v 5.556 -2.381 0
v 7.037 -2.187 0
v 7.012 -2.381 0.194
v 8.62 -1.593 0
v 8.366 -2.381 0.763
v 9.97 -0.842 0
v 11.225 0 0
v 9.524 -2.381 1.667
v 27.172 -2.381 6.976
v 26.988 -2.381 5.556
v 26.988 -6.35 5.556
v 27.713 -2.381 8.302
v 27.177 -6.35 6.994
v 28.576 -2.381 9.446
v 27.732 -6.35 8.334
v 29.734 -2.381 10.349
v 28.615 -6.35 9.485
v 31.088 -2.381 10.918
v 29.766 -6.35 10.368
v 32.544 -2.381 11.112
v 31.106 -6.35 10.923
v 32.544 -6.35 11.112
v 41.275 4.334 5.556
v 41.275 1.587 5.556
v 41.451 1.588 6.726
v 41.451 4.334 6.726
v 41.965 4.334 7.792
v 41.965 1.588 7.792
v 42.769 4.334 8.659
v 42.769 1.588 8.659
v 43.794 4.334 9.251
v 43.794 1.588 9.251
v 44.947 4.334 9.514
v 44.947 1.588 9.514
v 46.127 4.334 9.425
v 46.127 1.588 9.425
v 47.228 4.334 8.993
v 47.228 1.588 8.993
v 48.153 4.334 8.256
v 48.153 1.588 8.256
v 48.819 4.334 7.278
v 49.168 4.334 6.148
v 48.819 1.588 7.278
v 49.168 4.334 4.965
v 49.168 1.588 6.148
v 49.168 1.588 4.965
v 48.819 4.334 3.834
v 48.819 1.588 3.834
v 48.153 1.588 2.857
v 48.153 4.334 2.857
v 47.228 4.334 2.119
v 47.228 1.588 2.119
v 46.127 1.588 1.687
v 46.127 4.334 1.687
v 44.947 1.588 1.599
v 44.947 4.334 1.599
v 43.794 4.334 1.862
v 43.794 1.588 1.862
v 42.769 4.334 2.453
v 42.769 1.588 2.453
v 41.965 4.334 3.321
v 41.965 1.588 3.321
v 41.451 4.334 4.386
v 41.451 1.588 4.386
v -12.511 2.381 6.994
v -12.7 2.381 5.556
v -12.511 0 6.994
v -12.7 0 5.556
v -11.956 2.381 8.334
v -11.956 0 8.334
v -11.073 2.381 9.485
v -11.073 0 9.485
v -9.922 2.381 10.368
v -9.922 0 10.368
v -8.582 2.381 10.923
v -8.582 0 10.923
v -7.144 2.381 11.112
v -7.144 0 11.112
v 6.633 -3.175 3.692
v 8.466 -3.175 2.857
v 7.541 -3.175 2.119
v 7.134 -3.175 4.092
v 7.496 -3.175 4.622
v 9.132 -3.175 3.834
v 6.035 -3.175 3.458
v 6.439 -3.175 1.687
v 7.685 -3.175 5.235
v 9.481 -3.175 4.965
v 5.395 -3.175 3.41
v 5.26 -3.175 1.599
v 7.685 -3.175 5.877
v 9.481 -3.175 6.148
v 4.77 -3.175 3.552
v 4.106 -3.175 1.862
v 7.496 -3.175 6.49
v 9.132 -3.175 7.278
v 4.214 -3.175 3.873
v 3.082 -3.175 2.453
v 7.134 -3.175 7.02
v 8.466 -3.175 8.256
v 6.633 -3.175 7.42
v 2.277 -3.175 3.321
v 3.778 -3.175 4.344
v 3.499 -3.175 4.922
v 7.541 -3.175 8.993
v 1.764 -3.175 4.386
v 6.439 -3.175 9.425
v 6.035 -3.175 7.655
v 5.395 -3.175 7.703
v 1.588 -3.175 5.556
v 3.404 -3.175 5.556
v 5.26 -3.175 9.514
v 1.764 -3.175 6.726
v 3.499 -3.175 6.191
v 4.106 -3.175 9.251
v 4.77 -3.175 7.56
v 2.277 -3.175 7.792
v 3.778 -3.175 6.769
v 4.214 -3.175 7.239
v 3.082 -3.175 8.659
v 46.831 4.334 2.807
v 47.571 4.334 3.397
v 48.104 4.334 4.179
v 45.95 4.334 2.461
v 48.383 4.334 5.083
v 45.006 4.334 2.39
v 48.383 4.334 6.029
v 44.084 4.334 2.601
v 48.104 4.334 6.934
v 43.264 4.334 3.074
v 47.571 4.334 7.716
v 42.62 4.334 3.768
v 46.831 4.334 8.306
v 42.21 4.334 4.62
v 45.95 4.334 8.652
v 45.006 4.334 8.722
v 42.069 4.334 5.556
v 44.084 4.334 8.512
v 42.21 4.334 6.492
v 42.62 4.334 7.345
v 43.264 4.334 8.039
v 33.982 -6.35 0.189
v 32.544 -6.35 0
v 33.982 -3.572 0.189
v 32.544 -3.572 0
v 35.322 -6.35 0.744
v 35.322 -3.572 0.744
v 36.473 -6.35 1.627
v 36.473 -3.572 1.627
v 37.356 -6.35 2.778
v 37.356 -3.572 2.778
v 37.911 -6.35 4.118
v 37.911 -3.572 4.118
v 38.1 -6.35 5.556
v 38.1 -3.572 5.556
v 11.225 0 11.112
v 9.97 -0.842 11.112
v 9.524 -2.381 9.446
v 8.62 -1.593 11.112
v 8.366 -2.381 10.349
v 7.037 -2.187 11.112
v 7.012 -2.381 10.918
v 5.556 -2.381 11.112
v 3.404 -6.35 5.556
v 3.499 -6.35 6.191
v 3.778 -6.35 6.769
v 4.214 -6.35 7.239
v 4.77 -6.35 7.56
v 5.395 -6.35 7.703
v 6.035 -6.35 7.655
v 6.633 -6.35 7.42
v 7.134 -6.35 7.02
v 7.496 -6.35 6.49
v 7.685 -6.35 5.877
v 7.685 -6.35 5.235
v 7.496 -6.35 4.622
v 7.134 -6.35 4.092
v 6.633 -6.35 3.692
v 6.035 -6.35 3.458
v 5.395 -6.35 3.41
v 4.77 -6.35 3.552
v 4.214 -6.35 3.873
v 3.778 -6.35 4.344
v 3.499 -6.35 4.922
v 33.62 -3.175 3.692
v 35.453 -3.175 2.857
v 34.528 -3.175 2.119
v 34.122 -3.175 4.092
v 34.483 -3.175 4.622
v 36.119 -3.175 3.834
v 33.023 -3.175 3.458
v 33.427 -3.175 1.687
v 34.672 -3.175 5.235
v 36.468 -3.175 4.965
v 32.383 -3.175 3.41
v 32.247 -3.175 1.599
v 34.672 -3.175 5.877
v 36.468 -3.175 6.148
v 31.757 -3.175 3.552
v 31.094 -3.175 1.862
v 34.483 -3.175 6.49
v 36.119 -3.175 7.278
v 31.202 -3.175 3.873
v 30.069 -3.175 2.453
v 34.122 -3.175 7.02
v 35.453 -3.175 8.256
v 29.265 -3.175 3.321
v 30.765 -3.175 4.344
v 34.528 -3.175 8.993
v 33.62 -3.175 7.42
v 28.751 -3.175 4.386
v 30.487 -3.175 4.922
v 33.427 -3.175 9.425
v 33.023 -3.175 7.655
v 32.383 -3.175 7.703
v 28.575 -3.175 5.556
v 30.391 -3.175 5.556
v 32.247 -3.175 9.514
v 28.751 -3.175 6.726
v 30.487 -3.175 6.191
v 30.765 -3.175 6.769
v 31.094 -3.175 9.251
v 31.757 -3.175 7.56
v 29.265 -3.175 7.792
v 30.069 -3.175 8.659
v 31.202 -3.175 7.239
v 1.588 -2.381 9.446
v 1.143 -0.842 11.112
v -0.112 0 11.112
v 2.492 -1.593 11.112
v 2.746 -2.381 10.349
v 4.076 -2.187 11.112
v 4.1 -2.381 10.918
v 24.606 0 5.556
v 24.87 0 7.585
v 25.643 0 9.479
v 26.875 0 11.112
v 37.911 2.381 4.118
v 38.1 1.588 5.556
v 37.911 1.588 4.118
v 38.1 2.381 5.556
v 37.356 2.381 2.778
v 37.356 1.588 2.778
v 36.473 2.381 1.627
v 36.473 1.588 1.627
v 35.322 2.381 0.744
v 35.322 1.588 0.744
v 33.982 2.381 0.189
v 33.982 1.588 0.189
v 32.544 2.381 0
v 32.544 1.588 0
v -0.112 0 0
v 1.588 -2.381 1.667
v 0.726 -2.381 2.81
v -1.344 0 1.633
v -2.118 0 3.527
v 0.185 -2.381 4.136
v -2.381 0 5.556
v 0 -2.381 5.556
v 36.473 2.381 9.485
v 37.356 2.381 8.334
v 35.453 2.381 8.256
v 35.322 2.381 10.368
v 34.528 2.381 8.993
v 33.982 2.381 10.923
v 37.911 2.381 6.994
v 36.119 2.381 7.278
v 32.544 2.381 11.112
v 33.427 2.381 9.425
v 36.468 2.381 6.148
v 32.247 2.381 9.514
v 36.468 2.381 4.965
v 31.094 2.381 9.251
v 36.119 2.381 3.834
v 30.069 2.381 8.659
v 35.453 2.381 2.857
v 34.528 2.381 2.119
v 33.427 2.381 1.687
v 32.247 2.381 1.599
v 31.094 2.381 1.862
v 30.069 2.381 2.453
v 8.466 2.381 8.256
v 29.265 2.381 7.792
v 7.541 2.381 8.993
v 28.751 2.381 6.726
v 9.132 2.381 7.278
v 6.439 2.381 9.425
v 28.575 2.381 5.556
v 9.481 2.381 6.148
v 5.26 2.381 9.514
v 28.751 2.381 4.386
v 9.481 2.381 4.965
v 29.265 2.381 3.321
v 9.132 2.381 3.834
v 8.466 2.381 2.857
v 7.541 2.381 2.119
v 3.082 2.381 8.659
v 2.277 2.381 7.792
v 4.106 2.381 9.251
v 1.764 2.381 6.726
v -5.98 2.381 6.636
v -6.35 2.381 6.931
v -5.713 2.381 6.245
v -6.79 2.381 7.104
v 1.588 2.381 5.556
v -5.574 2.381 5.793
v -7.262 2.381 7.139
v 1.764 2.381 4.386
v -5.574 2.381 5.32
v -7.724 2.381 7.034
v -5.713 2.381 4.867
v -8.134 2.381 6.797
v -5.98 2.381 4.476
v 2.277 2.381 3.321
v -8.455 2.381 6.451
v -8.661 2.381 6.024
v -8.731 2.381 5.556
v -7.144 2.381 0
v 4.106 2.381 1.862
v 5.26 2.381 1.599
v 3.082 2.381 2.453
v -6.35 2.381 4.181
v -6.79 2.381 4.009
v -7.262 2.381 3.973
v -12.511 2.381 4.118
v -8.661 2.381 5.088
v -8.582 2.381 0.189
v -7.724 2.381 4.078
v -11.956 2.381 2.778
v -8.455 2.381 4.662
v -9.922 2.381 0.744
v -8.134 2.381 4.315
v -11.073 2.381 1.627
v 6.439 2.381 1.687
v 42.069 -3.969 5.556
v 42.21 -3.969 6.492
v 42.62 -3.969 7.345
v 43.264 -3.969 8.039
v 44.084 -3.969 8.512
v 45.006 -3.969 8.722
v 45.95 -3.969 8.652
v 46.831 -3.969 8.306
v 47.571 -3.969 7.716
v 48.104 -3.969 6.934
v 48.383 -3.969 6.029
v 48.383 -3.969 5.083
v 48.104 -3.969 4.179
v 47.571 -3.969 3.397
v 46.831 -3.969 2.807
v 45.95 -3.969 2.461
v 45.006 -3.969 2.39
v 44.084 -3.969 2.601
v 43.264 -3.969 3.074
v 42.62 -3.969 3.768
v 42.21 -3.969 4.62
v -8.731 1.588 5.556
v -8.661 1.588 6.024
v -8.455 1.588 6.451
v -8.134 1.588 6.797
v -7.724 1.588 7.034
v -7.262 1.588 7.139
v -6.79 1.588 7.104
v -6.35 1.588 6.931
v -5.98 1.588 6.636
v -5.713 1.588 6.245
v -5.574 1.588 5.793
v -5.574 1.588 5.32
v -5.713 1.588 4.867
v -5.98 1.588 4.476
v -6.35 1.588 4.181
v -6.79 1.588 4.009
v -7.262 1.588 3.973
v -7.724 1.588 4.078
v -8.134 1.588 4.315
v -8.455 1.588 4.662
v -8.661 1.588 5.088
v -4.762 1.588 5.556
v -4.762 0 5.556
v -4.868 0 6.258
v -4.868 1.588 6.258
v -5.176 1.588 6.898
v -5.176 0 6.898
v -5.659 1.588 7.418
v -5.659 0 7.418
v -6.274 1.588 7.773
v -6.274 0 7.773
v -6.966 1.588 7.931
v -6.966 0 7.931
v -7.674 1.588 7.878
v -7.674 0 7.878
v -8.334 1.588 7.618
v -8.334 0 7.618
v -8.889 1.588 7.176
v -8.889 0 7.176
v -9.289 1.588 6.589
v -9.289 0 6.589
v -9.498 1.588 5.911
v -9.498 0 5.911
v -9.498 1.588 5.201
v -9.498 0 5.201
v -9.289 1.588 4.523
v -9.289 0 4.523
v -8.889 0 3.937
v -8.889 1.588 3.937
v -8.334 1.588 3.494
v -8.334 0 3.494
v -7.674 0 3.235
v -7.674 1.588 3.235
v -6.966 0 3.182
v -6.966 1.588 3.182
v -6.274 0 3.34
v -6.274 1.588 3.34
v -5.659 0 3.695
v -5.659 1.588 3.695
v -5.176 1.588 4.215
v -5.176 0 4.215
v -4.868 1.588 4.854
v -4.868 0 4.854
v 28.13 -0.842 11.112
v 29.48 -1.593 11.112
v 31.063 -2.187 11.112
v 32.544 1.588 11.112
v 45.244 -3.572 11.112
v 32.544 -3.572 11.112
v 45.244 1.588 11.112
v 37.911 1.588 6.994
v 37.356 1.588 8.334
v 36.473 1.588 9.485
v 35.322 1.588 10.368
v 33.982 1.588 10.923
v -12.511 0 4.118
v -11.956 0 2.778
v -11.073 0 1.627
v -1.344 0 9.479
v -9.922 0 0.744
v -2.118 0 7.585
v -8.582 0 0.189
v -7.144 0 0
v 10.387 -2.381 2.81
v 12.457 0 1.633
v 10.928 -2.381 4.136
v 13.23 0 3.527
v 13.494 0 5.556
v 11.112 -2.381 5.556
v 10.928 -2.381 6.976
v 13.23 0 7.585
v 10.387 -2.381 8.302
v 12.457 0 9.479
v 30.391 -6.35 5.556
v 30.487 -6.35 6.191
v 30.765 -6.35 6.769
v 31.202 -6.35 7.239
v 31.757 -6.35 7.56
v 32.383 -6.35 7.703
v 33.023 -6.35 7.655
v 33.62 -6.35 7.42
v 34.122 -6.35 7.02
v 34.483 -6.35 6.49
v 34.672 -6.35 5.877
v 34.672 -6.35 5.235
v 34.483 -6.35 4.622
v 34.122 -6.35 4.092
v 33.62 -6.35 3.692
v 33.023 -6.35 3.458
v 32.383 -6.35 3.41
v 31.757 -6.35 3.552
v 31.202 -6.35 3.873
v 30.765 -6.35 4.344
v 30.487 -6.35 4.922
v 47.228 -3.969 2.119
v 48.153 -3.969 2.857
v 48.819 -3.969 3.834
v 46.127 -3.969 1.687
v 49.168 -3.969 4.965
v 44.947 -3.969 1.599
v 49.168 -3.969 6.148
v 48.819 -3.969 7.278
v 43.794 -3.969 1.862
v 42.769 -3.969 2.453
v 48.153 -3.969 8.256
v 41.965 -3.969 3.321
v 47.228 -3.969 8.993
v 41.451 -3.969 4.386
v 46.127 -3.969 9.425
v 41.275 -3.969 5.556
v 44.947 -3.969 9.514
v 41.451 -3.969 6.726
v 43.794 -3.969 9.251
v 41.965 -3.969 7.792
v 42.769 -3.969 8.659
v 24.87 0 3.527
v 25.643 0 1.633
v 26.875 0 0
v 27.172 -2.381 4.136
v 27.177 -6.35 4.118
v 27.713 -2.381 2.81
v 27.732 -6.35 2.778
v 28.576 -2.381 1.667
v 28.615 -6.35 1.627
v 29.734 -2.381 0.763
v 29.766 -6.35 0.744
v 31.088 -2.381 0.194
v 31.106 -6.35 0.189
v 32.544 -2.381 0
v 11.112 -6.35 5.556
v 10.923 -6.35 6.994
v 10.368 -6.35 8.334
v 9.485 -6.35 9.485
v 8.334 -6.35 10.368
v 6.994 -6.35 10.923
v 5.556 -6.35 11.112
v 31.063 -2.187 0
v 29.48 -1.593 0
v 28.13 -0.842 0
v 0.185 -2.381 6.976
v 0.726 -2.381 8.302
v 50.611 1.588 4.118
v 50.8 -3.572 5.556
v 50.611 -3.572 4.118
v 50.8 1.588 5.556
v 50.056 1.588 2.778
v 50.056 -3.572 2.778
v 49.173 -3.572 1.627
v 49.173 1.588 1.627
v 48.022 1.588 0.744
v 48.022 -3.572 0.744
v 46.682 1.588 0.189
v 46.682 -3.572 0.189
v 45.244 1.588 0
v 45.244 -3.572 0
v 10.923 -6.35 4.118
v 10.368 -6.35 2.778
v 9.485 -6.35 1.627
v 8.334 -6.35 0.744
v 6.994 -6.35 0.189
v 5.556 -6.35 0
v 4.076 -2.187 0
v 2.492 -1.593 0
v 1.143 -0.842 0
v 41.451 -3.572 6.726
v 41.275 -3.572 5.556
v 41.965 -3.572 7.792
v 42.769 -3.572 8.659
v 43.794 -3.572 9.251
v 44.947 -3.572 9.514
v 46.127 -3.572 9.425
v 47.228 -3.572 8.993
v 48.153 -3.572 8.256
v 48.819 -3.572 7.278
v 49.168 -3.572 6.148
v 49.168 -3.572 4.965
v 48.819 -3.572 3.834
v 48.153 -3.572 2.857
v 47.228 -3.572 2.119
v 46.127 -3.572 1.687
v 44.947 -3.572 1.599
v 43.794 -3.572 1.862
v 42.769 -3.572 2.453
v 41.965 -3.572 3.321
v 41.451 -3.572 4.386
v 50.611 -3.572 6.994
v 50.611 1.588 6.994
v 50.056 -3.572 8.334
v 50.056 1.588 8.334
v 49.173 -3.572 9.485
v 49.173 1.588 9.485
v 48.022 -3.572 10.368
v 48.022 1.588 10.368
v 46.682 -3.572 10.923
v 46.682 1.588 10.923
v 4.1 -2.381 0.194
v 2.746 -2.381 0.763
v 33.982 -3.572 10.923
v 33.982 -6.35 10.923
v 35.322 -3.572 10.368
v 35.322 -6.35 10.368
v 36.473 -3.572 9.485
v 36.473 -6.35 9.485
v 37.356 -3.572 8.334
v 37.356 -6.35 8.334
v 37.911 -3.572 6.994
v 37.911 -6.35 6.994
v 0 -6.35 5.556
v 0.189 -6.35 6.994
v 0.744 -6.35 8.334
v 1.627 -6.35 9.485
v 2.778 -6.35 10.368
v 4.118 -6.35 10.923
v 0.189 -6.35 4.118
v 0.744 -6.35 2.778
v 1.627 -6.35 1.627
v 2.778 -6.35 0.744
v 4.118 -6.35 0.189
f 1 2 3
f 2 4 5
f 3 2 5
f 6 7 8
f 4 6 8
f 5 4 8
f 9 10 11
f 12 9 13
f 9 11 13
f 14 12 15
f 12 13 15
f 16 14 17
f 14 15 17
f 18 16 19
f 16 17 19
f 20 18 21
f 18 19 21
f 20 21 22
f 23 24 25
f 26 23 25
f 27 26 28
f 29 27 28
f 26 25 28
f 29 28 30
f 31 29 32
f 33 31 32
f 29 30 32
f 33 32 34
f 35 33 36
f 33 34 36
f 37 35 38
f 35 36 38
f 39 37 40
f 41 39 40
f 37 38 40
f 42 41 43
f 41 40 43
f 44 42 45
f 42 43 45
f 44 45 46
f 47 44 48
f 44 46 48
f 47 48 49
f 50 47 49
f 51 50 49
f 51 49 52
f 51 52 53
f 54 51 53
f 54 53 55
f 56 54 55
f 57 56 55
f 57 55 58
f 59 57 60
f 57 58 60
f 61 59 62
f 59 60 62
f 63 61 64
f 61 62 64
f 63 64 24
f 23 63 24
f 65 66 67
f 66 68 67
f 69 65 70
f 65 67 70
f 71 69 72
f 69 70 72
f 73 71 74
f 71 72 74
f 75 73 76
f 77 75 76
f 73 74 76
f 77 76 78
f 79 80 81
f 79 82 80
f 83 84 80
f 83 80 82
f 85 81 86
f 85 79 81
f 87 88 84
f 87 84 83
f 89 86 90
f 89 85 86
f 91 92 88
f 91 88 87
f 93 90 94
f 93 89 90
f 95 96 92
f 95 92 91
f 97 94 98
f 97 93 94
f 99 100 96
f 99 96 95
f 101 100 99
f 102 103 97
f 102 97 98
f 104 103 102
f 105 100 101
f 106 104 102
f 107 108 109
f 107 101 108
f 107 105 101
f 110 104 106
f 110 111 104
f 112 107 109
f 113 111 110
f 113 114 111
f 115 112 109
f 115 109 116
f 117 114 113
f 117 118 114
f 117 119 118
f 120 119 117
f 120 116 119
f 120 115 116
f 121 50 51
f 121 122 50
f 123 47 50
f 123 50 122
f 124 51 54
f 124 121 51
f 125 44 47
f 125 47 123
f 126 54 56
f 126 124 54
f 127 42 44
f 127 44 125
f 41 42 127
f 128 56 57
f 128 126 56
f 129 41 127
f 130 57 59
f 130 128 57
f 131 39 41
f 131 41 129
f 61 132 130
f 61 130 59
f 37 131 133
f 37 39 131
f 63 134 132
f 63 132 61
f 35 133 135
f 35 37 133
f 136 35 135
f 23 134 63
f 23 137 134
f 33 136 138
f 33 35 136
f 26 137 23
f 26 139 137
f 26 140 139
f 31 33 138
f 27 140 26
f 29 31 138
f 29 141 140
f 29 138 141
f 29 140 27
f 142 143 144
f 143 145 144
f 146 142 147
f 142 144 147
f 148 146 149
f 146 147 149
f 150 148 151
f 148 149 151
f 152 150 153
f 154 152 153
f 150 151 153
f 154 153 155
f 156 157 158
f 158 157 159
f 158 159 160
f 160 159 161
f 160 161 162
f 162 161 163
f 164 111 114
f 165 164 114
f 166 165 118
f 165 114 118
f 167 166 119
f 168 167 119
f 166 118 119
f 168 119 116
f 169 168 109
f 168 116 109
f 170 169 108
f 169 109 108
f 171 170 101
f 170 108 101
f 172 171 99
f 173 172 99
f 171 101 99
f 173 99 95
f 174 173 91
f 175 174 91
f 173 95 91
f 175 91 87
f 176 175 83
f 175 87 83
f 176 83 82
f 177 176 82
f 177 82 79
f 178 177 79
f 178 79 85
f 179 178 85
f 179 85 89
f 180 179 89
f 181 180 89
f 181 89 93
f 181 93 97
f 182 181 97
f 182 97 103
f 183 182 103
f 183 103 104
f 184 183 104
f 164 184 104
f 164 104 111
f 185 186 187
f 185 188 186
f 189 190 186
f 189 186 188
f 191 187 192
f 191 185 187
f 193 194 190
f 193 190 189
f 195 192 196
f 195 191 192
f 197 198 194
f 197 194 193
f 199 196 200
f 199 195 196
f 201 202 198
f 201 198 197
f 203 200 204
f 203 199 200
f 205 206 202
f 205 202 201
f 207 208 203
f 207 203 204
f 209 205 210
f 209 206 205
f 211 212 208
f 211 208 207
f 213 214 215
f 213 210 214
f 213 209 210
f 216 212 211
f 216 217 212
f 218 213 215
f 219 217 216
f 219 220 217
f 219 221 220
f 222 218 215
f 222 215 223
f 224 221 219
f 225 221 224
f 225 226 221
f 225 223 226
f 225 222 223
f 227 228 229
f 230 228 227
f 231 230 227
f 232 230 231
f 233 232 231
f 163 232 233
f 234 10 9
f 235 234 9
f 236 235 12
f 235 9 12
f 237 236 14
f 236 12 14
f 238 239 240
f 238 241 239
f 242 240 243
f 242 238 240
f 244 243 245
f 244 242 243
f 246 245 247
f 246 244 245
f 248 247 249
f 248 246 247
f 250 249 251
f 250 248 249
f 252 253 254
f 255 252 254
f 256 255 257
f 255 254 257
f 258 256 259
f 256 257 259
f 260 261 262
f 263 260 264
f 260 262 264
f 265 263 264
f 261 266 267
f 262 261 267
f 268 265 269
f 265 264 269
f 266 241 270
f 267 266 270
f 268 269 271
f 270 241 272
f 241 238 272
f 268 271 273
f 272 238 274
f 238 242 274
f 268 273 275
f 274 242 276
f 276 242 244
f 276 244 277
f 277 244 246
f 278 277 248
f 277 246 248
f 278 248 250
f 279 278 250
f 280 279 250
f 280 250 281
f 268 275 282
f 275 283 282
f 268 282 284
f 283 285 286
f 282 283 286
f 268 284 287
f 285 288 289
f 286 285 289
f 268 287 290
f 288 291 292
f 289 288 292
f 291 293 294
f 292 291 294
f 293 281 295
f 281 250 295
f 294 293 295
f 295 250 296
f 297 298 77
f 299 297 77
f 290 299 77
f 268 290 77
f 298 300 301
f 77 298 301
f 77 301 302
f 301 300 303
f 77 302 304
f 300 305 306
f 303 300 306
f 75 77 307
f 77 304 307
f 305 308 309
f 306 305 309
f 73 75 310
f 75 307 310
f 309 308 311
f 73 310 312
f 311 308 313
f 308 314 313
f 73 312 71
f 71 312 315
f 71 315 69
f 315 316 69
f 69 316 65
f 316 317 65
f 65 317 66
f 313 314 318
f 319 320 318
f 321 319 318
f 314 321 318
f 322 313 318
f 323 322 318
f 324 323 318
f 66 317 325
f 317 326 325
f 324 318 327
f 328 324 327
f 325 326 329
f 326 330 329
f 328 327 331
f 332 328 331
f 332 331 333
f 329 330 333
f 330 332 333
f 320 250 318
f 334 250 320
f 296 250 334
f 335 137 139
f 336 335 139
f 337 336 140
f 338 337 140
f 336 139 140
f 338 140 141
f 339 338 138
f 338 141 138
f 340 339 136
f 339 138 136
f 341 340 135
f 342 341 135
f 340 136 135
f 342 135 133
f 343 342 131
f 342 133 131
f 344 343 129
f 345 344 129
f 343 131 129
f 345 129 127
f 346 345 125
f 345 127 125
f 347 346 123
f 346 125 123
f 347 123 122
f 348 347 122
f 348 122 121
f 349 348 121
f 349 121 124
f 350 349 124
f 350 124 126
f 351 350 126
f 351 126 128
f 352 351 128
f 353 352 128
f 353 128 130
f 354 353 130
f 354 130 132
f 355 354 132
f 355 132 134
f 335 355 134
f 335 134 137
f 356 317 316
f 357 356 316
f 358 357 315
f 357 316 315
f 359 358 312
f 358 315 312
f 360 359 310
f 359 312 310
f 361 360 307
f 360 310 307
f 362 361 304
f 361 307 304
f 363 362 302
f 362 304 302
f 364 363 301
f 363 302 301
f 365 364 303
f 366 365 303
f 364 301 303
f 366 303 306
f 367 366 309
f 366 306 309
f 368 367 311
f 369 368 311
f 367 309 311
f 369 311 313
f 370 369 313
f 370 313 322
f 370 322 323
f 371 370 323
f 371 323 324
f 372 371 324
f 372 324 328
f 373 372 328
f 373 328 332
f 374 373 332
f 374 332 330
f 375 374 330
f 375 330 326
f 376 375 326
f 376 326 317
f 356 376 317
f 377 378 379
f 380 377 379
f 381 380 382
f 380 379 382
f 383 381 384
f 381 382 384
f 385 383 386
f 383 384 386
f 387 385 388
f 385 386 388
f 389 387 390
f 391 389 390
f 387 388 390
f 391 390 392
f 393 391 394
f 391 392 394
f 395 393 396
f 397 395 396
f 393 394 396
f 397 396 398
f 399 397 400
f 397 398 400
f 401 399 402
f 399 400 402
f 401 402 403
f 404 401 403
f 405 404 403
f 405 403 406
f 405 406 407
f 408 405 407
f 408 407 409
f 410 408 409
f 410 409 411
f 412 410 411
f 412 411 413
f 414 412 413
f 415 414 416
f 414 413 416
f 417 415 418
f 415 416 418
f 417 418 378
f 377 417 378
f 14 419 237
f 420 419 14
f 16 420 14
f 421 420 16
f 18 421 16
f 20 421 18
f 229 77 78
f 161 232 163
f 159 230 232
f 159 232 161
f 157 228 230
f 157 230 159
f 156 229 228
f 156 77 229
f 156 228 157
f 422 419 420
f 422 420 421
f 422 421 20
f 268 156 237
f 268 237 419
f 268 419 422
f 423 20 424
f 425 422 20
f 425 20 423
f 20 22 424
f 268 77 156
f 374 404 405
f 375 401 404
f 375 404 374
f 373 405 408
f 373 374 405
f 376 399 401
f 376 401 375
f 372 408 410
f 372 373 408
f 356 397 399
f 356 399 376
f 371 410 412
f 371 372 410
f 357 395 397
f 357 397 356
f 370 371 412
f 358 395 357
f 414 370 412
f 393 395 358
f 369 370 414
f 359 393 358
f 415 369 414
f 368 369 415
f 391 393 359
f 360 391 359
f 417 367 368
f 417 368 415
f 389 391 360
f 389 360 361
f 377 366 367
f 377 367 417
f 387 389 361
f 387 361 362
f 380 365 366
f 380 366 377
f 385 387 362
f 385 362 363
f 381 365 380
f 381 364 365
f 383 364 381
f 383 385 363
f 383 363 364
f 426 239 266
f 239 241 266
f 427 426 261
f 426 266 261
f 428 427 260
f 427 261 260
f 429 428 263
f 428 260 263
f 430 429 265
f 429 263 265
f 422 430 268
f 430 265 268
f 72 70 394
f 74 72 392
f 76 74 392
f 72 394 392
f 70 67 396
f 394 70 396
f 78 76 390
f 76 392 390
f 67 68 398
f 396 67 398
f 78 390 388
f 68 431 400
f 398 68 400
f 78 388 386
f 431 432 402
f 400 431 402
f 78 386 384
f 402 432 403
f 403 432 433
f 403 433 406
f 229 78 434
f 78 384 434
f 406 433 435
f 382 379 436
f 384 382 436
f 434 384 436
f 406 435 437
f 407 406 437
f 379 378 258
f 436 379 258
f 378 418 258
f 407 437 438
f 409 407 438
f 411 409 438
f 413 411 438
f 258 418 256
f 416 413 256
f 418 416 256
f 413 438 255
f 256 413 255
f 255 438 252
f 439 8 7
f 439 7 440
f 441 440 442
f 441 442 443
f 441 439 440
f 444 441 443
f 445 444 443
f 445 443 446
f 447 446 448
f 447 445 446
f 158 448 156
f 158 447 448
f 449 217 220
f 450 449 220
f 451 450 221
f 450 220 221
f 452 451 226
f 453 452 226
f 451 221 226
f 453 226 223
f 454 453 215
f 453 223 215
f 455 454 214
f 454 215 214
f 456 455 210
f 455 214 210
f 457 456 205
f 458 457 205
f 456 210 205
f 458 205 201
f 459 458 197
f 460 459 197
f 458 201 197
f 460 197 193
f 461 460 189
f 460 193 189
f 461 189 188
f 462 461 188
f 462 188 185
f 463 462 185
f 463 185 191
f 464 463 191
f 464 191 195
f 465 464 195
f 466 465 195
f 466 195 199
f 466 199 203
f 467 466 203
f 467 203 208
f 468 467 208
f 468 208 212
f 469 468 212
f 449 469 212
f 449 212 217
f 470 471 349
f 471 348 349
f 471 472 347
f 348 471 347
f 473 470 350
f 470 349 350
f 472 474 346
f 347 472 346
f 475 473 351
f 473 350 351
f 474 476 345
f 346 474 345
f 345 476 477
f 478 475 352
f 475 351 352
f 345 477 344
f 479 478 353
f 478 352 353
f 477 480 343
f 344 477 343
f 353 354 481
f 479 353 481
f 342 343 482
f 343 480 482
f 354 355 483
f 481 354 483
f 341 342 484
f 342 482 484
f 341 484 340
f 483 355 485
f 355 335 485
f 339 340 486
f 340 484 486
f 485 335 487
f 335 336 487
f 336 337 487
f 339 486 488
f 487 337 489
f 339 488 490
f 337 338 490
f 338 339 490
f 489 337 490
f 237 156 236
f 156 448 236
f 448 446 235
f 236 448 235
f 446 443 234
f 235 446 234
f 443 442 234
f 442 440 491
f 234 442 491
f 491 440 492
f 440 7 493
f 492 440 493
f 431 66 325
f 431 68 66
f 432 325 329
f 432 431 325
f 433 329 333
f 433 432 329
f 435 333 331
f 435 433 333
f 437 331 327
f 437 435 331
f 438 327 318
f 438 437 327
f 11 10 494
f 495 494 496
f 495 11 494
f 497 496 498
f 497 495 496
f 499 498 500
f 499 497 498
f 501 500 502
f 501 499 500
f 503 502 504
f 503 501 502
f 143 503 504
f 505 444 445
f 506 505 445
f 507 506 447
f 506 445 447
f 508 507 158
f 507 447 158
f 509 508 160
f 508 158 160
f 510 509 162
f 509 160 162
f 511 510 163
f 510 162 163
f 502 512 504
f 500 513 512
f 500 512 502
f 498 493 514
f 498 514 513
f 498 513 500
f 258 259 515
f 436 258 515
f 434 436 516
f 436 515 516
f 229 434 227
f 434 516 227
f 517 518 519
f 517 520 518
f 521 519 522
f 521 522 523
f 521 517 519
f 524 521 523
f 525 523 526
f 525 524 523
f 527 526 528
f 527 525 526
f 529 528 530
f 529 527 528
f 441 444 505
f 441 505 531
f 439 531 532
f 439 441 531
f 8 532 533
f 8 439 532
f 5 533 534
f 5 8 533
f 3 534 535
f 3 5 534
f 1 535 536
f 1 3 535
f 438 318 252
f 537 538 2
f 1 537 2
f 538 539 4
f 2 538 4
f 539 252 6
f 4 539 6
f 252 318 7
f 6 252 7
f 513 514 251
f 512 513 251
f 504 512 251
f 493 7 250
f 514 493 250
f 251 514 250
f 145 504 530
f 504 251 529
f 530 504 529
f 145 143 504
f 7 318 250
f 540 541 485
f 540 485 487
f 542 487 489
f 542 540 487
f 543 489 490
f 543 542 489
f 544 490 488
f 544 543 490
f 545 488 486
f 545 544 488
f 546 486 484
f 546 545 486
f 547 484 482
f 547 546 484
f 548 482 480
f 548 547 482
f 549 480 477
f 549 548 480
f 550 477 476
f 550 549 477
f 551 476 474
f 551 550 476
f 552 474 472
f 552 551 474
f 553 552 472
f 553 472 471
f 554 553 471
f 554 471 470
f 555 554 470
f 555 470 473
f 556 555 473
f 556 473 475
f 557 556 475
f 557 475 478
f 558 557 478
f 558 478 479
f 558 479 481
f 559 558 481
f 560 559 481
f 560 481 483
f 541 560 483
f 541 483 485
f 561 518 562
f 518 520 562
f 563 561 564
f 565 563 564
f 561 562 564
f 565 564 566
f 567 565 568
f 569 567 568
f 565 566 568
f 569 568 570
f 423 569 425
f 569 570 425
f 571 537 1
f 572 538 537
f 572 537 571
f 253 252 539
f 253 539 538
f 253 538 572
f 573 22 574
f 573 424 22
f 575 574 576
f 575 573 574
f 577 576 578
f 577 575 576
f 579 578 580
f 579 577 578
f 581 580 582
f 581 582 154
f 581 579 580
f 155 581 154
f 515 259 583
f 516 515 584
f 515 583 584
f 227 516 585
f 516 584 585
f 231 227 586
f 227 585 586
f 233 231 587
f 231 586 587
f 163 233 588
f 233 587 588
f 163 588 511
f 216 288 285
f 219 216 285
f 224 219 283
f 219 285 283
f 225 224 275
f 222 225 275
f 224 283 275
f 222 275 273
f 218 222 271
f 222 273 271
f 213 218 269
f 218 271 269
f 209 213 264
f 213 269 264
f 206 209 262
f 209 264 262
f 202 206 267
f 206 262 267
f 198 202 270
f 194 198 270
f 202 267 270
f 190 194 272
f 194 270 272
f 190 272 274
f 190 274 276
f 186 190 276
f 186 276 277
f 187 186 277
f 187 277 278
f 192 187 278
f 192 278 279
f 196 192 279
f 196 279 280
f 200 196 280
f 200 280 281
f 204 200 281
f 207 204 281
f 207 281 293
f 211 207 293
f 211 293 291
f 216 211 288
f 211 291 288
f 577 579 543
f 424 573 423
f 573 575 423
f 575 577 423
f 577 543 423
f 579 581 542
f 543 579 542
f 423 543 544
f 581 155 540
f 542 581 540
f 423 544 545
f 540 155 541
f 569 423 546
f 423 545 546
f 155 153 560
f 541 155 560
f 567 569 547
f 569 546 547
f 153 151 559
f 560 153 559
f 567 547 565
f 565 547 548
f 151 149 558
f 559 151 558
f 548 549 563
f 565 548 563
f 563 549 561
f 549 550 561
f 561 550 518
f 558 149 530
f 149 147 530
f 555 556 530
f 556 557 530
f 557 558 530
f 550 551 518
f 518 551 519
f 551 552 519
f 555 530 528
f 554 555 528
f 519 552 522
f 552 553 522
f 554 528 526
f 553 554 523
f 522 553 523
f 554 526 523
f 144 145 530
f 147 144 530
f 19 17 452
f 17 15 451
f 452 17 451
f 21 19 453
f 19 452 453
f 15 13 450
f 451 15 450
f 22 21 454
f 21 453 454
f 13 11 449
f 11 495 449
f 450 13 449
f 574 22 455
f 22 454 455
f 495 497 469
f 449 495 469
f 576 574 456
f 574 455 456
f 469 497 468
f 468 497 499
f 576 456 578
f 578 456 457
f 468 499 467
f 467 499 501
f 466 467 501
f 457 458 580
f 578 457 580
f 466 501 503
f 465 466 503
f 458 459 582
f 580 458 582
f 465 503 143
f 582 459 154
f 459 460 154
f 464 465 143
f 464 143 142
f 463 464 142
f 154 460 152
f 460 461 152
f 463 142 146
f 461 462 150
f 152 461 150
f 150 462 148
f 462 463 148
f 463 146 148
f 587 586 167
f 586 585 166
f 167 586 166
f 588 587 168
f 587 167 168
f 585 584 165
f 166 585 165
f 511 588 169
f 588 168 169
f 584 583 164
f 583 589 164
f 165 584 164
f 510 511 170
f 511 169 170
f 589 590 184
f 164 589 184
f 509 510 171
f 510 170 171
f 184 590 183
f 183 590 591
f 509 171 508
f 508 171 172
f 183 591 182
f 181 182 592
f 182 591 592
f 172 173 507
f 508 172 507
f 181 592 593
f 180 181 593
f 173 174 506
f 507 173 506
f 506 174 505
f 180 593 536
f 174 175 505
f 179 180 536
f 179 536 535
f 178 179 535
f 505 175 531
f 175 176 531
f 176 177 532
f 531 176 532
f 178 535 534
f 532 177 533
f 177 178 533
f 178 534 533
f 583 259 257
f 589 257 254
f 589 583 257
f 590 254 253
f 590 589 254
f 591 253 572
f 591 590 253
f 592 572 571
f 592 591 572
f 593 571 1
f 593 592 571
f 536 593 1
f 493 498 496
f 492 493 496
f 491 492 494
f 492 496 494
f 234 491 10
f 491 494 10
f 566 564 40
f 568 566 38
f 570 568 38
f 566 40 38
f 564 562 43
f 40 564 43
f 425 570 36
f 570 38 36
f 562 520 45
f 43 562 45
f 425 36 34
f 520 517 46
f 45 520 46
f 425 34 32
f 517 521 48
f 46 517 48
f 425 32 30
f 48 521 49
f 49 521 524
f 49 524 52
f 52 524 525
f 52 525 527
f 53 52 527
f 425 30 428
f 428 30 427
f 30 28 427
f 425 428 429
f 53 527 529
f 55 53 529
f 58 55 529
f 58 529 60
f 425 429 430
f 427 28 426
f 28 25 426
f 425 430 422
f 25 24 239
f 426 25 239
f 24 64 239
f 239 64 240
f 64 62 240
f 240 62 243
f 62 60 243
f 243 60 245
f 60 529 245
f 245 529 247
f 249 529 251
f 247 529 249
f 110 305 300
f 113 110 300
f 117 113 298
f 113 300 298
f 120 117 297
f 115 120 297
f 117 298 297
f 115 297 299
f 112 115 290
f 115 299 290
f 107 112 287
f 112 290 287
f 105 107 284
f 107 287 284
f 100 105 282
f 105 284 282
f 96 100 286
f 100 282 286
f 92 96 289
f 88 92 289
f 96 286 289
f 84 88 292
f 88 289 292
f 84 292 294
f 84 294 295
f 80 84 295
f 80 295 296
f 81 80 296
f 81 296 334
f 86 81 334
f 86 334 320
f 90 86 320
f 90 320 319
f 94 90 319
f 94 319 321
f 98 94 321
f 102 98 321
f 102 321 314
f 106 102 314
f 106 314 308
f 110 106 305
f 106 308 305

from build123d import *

# Parameters (mm, degrees)
F1_DEPTH      = 11.1125
F2_R          = 3.175
F2_R_2        = 1.5875
F2_R_3        = 2.15265
F3_DEPTH      = 8.73125
F4_R          = 2.38125
F5_DEPTH      = 1.5875
F6_R          = 3.96875
F6_R_2        = 3.175
F7_DEPTH      = 2.746375
F7_DEPTH_BACK = 5.55625
F8_R          = 5.55624
F10_R         = 3.96875
F11_DEPTH     = 5.55625
F12_C1_SIZE   = 2.38125
F12_C2_SIZE   = 2.38125
F12_C3_SIZE   = 2.38125


# Not quite as in the source:
# - a fillet or chamfer is up to 0.001 mm smaller than in the source, because OpenCascade refuses the exact size


with BuildPart() as f1:
    # F0 (on Top) → F1 (new body)
    with BuildSketch(Plane.XY):
        Polygon((-12.7, 0), (0, 0), (0, -6.35), (11.1125, -6.35), (11.1125, 0), (26.9875, 0), (26.9875, -6.35), (38.1, -6.35), (38.1, -3.571875), (50.8, -3.571875), (50.8, 1.5875), (38.1, 1.5875), (38.1, 2.38125), (-12.7, 2.38125), align=None)
    extrude(amount=F1_DEPTH)

    # F2 (on face) → F3 (cut, through all)
    with BuildSketch(Plane(origin=(0, 2.38125, 0), x_dir=(-1, 0, 0), z_dir=(0, 1, 0))):
        with Locations((-45.24375, 5.55625)):
            Circle(F2_R)
        with Locations((7.14375, 5.55625)):
            Circle(F2_R_2)
        with Locations((-5.55625, 5.55625)):
            Circle(F2_R_3)
        with Locations((-32.54375, 5.55625)):
            Circle(F2_R_3)
    extrude(amount=-F3_DEPTH, mode=Mode.SUBTRACT)

    # F4 (on face) → F5 (cut)
    with BuildSketch(Plane.XZ):
        with Locations((-7.14375, 5.55625)):
            Circle(F4_R)
    extrude(amount=-F5_DEPTH, mode=Mode.SUBTRACT)

    # F6 (on face) → F7 (join, two sides)
    with BuildSketch(Plane(origin=(0, 1.5875, 0), x_dir=(-1, 0, 0), z_dir=(0, 1, 0))) as f7_sk:
        with Locations((-45.24375, 5.55625)):
            Circle(F6_R)
        with Locations((-45.24375, 5.55625)):
            Circle(F6_R_2, mode=Mode.SUBTRACT)
    extrude(amount=F7_DEPTH)
    extrude(f7_sk.sketch, amount=-F7_DEPTH_BACK)

    # F8 (radius 5.55625 in the source; OpenCascade refuses exactly that, so slightly less here)
    f8_edges = [f1.edges().sort_by_distance(p)[0] for p in [
        (0, -3.175, 0),
        (0, -3.175, 11.1125),
        (38.1, -4.960938, 0),
        (38.1, -4.960938, 11.1125),
        (38.1, 1.984375, 0),
        (38.1, 1.984375, 11.1125),
        (11.1125, -3.175, 11.1125),
        (11.1125, -3.175, 0),
        (26.9875, -3.175, 11.1125),
        (26.9875, -3.175, 0),
        (50.8, -0.992188, 11.1125),
        (50.8, -0.992188, 0),
        (-12.7, 1.190625, 11.1125),
        (-12.7, 1.190625, 0),
    ]]
    fillet(f8_edges, radius=F8_R)

    # F10 (on face) → F11 (cut, through all)
    with BuildSketch(Plane(origin=(0, 2.38125, 0), x_dir=(-1, 0, 0), z_dir=(0, 1, 0))):
        with Locations((-32.54375, 5.55625)):
            Circle(F10_R)
        with Locations((-5.55625, 5.55625)):
            Circle(F10_R)
    extrude(amount=-F11_DEPTH, mode=Mode.SUBTRACT)

    # F12: chamfer of 2.38125 on 5 edges, made by hand

    # F12_c1
    f12_c1_edges = [f1.edges().sort_by_distance(p)[0] for p in [
        (1.6273850181, 0, 9.4851149819),
        (0, 0, 5.55625),
        (1.6273850181, 0, 1.6273850181),
    ]]
    chamfer(f12_c1_edges, length=F12_C1_SIZE)

    # F12_c2
    f12_c2_edges = [f1.edges().sort_by_distance(p)[0] for p in [
        (28.6148850181, 0, 9.4851149819),
        (26.9875, 0, 5.55625),
        (28.6148850181, 0, 1.6273850181),
    ]]
    chamfer(f12_c2_edges, length=F12_C2_SIZE)

    # F12_c3
    f12_c3_edges = [f1.edges().sort_by_distance(p)[0] for p in [
        (11.1125, 0, 5.55625),
        (9.4851149819, 0, 9.4851149819),
        (9.4851149819, 0, 1.6273850181),
    ]]
    chamfer(f12_c3_edges, length=F12_C3_SIZE)


solid = f1.part
